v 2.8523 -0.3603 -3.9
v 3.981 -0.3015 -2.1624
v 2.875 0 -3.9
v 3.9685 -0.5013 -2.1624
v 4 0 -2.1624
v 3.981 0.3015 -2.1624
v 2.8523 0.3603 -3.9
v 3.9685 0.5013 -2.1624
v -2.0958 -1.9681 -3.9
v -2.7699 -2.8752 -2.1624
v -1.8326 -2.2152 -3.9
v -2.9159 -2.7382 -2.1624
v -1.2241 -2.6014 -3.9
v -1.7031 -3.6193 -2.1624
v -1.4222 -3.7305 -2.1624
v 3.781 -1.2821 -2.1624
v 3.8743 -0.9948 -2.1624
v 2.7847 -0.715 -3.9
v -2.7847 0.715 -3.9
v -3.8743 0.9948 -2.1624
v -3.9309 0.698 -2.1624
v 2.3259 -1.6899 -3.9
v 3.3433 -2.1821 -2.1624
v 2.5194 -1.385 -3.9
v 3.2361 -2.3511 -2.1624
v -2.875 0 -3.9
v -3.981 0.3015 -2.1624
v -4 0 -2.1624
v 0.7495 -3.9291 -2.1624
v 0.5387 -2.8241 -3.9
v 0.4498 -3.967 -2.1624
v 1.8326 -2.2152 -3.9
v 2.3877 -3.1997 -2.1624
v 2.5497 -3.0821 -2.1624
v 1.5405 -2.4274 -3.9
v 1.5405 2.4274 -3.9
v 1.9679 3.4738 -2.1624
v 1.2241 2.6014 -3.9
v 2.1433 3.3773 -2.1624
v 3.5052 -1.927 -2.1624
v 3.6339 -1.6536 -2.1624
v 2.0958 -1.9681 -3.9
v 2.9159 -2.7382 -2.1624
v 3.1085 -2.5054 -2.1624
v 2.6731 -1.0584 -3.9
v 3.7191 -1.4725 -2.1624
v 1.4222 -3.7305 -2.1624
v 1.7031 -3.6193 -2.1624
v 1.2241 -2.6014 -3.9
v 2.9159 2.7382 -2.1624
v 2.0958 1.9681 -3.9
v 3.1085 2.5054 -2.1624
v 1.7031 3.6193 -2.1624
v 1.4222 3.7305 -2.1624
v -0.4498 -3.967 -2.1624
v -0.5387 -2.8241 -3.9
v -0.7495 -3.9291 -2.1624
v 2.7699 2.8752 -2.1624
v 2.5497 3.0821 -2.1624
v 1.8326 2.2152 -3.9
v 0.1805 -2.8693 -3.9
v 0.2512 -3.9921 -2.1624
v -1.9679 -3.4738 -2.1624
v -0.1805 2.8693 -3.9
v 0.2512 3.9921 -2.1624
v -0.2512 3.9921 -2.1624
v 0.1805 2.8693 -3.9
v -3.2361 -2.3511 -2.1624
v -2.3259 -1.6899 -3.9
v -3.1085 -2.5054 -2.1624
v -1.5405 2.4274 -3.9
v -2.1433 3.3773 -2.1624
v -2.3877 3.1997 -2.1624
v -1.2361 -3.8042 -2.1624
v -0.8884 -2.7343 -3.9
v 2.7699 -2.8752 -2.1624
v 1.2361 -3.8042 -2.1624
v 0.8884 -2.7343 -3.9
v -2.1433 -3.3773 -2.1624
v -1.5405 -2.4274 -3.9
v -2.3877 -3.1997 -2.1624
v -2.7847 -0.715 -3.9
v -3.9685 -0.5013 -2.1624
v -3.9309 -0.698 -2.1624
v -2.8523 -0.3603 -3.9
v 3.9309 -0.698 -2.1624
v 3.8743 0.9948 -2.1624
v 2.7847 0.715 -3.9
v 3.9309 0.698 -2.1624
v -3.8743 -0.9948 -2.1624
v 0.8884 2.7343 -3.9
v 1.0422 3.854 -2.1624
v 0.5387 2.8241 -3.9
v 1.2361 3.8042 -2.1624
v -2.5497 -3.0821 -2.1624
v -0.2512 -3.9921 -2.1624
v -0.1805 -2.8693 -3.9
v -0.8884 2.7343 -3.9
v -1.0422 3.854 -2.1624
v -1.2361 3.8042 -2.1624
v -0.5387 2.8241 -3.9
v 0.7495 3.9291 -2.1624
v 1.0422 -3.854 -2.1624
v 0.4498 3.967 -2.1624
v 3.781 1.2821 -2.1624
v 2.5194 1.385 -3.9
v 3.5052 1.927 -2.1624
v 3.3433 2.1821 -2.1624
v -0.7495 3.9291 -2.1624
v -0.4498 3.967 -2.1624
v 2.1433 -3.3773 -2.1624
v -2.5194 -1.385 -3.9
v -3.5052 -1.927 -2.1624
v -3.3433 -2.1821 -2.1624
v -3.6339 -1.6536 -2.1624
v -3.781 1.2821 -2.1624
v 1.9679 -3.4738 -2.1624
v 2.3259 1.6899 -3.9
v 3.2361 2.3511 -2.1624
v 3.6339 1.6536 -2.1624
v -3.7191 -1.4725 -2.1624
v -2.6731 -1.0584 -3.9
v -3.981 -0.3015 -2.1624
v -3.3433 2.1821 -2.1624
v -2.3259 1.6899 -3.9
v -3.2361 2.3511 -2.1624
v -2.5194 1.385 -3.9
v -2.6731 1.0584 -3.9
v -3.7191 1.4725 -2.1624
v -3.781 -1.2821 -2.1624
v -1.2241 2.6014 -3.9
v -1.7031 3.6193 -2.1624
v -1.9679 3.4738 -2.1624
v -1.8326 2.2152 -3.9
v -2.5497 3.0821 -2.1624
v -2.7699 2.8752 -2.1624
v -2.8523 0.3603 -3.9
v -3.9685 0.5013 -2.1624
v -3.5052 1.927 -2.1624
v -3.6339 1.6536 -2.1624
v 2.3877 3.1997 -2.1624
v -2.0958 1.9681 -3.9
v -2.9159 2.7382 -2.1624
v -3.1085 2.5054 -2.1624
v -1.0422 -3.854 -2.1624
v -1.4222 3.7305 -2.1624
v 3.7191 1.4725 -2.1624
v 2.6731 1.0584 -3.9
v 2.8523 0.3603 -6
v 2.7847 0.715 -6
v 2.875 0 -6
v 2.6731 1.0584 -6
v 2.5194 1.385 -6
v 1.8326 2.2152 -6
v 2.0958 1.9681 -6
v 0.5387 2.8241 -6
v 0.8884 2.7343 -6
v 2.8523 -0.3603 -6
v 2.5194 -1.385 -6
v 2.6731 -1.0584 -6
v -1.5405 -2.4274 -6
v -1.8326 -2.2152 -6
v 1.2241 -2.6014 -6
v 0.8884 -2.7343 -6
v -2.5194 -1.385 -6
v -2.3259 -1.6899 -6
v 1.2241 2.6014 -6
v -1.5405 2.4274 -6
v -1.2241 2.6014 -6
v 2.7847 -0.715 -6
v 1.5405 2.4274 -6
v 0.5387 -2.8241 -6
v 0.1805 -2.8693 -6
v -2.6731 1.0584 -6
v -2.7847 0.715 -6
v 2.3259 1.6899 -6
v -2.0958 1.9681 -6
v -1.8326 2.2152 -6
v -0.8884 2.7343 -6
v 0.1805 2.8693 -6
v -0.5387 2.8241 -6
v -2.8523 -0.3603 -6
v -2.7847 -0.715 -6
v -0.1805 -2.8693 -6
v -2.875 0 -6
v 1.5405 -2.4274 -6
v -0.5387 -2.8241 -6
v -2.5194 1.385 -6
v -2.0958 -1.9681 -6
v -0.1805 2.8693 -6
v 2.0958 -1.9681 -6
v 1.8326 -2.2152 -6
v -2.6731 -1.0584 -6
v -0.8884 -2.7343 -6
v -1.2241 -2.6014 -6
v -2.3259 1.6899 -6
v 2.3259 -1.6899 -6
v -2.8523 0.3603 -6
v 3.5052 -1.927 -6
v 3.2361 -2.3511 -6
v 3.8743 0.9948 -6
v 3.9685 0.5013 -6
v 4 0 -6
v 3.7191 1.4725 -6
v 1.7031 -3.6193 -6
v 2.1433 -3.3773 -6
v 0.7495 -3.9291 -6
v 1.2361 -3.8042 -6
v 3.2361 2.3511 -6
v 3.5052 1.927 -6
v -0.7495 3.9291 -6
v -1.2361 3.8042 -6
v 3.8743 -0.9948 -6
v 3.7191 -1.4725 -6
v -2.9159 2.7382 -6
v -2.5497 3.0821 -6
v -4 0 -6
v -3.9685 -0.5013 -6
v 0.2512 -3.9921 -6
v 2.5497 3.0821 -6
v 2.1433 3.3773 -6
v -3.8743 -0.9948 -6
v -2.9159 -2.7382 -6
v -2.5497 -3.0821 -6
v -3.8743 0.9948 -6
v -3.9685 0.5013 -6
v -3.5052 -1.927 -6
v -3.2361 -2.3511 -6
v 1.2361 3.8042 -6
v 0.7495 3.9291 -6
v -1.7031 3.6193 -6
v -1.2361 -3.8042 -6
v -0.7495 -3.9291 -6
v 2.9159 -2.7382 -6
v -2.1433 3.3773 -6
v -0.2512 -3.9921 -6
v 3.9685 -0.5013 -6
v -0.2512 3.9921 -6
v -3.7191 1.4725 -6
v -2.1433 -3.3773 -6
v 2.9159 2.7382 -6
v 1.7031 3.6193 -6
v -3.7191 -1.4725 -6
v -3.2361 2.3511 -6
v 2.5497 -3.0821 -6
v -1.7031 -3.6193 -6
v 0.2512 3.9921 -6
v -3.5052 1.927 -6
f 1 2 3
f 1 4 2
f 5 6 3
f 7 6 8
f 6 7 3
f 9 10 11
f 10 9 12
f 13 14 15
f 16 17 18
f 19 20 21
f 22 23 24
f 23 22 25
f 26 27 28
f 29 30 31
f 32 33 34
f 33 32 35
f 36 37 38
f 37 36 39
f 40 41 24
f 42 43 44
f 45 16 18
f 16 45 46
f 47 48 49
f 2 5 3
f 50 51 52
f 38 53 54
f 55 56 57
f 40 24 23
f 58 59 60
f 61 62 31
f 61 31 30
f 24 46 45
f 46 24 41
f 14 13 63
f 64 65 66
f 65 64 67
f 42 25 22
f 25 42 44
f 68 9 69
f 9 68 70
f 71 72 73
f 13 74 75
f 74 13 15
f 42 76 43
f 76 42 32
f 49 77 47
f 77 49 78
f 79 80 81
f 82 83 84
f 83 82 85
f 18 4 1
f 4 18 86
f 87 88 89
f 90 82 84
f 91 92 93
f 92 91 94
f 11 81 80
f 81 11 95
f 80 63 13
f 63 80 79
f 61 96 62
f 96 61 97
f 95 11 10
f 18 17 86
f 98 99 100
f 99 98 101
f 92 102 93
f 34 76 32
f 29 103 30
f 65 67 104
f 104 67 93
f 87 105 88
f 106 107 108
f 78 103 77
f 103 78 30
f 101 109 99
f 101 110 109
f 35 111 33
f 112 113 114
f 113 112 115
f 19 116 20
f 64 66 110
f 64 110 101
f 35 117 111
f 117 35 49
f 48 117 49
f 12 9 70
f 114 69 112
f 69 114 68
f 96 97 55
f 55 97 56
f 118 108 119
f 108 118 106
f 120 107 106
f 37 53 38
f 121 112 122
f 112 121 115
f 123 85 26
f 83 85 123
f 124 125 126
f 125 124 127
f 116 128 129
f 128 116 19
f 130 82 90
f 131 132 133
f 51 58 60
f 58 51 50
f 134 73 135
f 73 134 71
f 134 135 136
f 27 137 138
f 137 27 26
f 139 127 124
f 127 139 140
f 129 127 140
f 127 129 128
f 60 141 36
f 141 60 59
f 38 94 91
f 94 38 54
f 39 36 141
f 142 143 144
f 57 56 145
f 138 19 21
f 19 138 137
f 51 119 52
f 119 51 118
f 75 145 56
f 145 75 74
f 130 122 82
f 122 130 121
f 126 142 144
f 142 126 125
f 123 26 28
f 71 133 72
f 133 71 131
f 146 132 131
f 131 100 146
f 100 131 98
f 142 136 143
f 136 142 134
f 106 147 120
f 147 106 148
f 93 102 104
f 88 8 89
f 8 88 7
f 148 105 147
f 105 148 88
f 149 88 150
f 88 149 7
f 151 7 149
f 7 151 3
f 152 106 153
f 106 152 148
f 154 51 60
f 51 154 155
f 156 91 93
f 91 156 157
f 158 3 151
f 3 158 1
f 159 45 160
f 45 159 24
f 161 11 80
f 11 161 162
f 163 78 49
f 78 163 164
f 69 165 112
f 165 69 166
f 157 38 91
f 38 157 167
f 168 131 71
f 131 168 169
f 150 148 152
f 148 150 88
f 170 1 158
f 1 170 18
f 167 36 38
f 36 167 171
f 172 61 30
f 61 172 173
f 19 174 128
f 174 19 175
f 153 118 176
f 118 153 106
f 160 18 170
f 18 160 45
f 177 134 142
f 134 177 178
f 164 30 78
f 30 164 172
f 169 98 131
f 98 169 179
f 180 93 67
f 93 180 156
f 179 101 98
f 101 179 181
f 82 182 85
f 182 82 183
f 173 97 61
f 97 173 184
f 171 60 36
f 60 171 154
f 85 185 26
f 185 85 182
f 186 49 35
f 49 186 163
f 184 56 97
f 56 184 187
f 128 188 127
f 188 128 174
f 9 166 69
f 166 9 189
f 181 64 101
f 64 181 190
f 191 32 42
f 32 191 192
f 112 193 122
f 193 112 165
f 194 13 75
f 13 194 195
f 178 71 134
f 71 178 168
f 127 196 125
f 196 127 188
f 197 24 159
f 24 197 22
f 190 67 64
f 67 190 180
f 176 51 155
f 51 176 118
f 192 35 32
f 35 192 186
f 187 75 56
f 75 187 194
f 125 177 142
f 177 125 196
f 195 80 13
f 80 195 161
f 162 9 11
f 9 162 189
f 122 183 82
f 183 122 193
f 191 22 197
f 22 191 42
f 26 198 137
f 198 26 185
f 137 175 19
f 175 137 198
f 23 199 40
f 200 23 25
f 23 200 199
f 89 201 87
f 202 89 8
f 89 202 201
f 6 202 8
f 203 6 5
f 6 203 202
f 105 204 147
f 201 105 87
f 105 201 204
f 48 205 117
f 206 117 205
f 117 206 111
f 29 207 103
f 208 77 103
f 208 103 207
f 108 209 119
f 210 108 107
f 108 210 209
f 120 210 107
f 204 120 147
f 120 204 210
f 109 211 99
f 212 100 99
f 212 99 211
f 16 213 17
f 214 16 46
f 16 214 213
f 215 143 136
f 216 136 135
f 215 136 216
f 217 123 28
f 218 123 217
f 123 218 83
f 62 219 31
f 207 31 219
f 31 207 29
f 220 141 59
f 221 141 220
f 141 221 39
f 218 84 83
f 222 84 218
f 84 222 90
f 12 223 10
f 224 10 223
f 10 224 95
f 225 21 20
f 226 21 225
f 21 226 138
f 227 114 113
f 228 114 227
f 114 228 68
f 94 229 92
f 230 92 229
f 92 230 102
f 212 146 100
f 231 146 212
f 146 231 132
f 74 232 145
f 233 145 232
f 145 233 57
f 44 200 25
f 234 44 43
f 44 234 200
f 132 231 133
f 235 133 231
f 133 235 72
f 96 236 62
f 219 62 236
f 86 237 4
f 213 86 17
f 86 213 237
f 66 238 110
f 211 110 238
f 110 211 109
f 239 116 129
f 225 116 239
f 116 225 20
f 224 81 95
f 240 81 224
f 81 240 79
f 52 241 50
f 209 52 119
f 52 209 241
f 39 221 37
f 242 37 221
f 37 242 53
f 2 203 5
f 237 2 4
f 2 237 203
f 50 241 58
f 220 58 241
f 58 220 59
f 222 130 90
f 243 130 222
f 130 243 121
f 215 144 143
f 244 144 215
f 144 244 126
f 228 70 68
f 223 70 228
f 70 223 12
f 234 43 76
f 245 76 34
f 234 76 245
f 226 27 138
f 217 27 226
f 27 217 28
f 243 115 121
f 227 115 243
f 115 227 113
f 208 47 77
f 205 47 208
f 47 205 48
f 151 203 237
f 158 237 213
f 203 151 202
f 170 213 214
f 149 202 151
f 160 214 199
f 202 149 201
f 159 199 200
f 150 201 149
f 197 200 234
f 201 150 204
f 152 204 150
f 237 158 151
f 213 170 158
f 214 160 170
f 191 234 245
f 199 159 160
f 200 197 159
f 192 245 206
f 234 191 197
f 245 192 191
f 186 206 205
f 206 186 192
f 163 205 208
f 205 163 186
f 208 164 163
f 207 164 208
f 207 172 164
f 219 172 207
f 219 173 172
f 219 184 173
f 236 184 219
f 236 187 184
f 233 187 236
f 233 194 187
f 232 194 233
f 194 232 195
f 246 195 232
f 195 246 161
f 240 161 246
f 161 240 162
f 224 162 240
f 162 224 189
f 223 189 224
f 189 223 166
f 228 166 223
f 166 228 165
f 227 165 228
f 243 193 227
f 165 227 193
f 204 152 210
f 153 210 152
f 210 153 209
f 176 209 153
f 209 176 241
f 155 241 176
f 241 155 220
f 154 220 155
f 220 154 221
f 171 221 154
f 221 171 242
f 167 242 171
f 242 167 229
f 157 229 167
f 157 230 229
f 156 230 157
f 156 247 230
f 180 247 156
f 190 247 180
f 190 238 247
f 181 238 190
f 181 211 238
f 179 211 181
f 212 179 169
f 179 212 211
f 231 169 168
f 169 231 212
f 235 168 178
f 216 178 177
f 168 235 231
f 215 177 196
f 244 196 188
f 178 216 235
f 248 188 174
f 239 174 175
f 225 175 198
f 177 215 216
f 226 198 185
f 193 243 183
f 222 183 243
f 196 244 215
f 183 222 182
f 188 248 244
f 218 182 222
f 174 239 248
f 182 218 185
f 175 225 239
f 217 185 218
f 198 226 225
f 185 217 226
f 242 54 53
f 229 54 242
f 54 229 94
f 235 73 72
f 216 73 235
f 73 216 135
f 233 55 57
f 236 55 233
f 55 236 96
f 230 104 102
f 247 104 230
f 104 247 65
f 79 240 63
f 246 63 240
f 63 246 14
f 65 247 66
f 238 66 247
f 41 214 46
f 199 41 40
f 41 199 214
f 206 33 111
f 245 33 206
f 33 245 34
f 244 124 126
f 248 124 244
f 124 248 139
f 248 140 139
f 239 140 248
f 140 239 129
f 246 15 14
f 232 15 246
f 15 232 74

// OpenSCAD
$fn = 50;

difference() {
	union() {
		translate(v = [0, 0, -6.0]) {
			cylinder(h = 6, r = 4.0);
		}
	}
	union() {
		translate(v = [0, 0, 0]) {
			rotate(a = [0, 0, 0]) {
				difference() {
					union() {
						translate(v = [0, 0, -9.0]) {
							cylinder(h = 9, r = 2.6);
						}
						translate(v = [0, 0, -3.9]) {
							cylinder(h = 3.9, r1 = 2.875, r2 = 5.4);
						}
						translate(v = [0, 0, -9.0]) {
							cylinder(h = 9, r = 2.875);
						}
						translate(v = [0, 0, -9.0]) {
							cylinder(h = 9, r = 2.6);
						}
					}
					union();
				}
			}
		}
	}
}
